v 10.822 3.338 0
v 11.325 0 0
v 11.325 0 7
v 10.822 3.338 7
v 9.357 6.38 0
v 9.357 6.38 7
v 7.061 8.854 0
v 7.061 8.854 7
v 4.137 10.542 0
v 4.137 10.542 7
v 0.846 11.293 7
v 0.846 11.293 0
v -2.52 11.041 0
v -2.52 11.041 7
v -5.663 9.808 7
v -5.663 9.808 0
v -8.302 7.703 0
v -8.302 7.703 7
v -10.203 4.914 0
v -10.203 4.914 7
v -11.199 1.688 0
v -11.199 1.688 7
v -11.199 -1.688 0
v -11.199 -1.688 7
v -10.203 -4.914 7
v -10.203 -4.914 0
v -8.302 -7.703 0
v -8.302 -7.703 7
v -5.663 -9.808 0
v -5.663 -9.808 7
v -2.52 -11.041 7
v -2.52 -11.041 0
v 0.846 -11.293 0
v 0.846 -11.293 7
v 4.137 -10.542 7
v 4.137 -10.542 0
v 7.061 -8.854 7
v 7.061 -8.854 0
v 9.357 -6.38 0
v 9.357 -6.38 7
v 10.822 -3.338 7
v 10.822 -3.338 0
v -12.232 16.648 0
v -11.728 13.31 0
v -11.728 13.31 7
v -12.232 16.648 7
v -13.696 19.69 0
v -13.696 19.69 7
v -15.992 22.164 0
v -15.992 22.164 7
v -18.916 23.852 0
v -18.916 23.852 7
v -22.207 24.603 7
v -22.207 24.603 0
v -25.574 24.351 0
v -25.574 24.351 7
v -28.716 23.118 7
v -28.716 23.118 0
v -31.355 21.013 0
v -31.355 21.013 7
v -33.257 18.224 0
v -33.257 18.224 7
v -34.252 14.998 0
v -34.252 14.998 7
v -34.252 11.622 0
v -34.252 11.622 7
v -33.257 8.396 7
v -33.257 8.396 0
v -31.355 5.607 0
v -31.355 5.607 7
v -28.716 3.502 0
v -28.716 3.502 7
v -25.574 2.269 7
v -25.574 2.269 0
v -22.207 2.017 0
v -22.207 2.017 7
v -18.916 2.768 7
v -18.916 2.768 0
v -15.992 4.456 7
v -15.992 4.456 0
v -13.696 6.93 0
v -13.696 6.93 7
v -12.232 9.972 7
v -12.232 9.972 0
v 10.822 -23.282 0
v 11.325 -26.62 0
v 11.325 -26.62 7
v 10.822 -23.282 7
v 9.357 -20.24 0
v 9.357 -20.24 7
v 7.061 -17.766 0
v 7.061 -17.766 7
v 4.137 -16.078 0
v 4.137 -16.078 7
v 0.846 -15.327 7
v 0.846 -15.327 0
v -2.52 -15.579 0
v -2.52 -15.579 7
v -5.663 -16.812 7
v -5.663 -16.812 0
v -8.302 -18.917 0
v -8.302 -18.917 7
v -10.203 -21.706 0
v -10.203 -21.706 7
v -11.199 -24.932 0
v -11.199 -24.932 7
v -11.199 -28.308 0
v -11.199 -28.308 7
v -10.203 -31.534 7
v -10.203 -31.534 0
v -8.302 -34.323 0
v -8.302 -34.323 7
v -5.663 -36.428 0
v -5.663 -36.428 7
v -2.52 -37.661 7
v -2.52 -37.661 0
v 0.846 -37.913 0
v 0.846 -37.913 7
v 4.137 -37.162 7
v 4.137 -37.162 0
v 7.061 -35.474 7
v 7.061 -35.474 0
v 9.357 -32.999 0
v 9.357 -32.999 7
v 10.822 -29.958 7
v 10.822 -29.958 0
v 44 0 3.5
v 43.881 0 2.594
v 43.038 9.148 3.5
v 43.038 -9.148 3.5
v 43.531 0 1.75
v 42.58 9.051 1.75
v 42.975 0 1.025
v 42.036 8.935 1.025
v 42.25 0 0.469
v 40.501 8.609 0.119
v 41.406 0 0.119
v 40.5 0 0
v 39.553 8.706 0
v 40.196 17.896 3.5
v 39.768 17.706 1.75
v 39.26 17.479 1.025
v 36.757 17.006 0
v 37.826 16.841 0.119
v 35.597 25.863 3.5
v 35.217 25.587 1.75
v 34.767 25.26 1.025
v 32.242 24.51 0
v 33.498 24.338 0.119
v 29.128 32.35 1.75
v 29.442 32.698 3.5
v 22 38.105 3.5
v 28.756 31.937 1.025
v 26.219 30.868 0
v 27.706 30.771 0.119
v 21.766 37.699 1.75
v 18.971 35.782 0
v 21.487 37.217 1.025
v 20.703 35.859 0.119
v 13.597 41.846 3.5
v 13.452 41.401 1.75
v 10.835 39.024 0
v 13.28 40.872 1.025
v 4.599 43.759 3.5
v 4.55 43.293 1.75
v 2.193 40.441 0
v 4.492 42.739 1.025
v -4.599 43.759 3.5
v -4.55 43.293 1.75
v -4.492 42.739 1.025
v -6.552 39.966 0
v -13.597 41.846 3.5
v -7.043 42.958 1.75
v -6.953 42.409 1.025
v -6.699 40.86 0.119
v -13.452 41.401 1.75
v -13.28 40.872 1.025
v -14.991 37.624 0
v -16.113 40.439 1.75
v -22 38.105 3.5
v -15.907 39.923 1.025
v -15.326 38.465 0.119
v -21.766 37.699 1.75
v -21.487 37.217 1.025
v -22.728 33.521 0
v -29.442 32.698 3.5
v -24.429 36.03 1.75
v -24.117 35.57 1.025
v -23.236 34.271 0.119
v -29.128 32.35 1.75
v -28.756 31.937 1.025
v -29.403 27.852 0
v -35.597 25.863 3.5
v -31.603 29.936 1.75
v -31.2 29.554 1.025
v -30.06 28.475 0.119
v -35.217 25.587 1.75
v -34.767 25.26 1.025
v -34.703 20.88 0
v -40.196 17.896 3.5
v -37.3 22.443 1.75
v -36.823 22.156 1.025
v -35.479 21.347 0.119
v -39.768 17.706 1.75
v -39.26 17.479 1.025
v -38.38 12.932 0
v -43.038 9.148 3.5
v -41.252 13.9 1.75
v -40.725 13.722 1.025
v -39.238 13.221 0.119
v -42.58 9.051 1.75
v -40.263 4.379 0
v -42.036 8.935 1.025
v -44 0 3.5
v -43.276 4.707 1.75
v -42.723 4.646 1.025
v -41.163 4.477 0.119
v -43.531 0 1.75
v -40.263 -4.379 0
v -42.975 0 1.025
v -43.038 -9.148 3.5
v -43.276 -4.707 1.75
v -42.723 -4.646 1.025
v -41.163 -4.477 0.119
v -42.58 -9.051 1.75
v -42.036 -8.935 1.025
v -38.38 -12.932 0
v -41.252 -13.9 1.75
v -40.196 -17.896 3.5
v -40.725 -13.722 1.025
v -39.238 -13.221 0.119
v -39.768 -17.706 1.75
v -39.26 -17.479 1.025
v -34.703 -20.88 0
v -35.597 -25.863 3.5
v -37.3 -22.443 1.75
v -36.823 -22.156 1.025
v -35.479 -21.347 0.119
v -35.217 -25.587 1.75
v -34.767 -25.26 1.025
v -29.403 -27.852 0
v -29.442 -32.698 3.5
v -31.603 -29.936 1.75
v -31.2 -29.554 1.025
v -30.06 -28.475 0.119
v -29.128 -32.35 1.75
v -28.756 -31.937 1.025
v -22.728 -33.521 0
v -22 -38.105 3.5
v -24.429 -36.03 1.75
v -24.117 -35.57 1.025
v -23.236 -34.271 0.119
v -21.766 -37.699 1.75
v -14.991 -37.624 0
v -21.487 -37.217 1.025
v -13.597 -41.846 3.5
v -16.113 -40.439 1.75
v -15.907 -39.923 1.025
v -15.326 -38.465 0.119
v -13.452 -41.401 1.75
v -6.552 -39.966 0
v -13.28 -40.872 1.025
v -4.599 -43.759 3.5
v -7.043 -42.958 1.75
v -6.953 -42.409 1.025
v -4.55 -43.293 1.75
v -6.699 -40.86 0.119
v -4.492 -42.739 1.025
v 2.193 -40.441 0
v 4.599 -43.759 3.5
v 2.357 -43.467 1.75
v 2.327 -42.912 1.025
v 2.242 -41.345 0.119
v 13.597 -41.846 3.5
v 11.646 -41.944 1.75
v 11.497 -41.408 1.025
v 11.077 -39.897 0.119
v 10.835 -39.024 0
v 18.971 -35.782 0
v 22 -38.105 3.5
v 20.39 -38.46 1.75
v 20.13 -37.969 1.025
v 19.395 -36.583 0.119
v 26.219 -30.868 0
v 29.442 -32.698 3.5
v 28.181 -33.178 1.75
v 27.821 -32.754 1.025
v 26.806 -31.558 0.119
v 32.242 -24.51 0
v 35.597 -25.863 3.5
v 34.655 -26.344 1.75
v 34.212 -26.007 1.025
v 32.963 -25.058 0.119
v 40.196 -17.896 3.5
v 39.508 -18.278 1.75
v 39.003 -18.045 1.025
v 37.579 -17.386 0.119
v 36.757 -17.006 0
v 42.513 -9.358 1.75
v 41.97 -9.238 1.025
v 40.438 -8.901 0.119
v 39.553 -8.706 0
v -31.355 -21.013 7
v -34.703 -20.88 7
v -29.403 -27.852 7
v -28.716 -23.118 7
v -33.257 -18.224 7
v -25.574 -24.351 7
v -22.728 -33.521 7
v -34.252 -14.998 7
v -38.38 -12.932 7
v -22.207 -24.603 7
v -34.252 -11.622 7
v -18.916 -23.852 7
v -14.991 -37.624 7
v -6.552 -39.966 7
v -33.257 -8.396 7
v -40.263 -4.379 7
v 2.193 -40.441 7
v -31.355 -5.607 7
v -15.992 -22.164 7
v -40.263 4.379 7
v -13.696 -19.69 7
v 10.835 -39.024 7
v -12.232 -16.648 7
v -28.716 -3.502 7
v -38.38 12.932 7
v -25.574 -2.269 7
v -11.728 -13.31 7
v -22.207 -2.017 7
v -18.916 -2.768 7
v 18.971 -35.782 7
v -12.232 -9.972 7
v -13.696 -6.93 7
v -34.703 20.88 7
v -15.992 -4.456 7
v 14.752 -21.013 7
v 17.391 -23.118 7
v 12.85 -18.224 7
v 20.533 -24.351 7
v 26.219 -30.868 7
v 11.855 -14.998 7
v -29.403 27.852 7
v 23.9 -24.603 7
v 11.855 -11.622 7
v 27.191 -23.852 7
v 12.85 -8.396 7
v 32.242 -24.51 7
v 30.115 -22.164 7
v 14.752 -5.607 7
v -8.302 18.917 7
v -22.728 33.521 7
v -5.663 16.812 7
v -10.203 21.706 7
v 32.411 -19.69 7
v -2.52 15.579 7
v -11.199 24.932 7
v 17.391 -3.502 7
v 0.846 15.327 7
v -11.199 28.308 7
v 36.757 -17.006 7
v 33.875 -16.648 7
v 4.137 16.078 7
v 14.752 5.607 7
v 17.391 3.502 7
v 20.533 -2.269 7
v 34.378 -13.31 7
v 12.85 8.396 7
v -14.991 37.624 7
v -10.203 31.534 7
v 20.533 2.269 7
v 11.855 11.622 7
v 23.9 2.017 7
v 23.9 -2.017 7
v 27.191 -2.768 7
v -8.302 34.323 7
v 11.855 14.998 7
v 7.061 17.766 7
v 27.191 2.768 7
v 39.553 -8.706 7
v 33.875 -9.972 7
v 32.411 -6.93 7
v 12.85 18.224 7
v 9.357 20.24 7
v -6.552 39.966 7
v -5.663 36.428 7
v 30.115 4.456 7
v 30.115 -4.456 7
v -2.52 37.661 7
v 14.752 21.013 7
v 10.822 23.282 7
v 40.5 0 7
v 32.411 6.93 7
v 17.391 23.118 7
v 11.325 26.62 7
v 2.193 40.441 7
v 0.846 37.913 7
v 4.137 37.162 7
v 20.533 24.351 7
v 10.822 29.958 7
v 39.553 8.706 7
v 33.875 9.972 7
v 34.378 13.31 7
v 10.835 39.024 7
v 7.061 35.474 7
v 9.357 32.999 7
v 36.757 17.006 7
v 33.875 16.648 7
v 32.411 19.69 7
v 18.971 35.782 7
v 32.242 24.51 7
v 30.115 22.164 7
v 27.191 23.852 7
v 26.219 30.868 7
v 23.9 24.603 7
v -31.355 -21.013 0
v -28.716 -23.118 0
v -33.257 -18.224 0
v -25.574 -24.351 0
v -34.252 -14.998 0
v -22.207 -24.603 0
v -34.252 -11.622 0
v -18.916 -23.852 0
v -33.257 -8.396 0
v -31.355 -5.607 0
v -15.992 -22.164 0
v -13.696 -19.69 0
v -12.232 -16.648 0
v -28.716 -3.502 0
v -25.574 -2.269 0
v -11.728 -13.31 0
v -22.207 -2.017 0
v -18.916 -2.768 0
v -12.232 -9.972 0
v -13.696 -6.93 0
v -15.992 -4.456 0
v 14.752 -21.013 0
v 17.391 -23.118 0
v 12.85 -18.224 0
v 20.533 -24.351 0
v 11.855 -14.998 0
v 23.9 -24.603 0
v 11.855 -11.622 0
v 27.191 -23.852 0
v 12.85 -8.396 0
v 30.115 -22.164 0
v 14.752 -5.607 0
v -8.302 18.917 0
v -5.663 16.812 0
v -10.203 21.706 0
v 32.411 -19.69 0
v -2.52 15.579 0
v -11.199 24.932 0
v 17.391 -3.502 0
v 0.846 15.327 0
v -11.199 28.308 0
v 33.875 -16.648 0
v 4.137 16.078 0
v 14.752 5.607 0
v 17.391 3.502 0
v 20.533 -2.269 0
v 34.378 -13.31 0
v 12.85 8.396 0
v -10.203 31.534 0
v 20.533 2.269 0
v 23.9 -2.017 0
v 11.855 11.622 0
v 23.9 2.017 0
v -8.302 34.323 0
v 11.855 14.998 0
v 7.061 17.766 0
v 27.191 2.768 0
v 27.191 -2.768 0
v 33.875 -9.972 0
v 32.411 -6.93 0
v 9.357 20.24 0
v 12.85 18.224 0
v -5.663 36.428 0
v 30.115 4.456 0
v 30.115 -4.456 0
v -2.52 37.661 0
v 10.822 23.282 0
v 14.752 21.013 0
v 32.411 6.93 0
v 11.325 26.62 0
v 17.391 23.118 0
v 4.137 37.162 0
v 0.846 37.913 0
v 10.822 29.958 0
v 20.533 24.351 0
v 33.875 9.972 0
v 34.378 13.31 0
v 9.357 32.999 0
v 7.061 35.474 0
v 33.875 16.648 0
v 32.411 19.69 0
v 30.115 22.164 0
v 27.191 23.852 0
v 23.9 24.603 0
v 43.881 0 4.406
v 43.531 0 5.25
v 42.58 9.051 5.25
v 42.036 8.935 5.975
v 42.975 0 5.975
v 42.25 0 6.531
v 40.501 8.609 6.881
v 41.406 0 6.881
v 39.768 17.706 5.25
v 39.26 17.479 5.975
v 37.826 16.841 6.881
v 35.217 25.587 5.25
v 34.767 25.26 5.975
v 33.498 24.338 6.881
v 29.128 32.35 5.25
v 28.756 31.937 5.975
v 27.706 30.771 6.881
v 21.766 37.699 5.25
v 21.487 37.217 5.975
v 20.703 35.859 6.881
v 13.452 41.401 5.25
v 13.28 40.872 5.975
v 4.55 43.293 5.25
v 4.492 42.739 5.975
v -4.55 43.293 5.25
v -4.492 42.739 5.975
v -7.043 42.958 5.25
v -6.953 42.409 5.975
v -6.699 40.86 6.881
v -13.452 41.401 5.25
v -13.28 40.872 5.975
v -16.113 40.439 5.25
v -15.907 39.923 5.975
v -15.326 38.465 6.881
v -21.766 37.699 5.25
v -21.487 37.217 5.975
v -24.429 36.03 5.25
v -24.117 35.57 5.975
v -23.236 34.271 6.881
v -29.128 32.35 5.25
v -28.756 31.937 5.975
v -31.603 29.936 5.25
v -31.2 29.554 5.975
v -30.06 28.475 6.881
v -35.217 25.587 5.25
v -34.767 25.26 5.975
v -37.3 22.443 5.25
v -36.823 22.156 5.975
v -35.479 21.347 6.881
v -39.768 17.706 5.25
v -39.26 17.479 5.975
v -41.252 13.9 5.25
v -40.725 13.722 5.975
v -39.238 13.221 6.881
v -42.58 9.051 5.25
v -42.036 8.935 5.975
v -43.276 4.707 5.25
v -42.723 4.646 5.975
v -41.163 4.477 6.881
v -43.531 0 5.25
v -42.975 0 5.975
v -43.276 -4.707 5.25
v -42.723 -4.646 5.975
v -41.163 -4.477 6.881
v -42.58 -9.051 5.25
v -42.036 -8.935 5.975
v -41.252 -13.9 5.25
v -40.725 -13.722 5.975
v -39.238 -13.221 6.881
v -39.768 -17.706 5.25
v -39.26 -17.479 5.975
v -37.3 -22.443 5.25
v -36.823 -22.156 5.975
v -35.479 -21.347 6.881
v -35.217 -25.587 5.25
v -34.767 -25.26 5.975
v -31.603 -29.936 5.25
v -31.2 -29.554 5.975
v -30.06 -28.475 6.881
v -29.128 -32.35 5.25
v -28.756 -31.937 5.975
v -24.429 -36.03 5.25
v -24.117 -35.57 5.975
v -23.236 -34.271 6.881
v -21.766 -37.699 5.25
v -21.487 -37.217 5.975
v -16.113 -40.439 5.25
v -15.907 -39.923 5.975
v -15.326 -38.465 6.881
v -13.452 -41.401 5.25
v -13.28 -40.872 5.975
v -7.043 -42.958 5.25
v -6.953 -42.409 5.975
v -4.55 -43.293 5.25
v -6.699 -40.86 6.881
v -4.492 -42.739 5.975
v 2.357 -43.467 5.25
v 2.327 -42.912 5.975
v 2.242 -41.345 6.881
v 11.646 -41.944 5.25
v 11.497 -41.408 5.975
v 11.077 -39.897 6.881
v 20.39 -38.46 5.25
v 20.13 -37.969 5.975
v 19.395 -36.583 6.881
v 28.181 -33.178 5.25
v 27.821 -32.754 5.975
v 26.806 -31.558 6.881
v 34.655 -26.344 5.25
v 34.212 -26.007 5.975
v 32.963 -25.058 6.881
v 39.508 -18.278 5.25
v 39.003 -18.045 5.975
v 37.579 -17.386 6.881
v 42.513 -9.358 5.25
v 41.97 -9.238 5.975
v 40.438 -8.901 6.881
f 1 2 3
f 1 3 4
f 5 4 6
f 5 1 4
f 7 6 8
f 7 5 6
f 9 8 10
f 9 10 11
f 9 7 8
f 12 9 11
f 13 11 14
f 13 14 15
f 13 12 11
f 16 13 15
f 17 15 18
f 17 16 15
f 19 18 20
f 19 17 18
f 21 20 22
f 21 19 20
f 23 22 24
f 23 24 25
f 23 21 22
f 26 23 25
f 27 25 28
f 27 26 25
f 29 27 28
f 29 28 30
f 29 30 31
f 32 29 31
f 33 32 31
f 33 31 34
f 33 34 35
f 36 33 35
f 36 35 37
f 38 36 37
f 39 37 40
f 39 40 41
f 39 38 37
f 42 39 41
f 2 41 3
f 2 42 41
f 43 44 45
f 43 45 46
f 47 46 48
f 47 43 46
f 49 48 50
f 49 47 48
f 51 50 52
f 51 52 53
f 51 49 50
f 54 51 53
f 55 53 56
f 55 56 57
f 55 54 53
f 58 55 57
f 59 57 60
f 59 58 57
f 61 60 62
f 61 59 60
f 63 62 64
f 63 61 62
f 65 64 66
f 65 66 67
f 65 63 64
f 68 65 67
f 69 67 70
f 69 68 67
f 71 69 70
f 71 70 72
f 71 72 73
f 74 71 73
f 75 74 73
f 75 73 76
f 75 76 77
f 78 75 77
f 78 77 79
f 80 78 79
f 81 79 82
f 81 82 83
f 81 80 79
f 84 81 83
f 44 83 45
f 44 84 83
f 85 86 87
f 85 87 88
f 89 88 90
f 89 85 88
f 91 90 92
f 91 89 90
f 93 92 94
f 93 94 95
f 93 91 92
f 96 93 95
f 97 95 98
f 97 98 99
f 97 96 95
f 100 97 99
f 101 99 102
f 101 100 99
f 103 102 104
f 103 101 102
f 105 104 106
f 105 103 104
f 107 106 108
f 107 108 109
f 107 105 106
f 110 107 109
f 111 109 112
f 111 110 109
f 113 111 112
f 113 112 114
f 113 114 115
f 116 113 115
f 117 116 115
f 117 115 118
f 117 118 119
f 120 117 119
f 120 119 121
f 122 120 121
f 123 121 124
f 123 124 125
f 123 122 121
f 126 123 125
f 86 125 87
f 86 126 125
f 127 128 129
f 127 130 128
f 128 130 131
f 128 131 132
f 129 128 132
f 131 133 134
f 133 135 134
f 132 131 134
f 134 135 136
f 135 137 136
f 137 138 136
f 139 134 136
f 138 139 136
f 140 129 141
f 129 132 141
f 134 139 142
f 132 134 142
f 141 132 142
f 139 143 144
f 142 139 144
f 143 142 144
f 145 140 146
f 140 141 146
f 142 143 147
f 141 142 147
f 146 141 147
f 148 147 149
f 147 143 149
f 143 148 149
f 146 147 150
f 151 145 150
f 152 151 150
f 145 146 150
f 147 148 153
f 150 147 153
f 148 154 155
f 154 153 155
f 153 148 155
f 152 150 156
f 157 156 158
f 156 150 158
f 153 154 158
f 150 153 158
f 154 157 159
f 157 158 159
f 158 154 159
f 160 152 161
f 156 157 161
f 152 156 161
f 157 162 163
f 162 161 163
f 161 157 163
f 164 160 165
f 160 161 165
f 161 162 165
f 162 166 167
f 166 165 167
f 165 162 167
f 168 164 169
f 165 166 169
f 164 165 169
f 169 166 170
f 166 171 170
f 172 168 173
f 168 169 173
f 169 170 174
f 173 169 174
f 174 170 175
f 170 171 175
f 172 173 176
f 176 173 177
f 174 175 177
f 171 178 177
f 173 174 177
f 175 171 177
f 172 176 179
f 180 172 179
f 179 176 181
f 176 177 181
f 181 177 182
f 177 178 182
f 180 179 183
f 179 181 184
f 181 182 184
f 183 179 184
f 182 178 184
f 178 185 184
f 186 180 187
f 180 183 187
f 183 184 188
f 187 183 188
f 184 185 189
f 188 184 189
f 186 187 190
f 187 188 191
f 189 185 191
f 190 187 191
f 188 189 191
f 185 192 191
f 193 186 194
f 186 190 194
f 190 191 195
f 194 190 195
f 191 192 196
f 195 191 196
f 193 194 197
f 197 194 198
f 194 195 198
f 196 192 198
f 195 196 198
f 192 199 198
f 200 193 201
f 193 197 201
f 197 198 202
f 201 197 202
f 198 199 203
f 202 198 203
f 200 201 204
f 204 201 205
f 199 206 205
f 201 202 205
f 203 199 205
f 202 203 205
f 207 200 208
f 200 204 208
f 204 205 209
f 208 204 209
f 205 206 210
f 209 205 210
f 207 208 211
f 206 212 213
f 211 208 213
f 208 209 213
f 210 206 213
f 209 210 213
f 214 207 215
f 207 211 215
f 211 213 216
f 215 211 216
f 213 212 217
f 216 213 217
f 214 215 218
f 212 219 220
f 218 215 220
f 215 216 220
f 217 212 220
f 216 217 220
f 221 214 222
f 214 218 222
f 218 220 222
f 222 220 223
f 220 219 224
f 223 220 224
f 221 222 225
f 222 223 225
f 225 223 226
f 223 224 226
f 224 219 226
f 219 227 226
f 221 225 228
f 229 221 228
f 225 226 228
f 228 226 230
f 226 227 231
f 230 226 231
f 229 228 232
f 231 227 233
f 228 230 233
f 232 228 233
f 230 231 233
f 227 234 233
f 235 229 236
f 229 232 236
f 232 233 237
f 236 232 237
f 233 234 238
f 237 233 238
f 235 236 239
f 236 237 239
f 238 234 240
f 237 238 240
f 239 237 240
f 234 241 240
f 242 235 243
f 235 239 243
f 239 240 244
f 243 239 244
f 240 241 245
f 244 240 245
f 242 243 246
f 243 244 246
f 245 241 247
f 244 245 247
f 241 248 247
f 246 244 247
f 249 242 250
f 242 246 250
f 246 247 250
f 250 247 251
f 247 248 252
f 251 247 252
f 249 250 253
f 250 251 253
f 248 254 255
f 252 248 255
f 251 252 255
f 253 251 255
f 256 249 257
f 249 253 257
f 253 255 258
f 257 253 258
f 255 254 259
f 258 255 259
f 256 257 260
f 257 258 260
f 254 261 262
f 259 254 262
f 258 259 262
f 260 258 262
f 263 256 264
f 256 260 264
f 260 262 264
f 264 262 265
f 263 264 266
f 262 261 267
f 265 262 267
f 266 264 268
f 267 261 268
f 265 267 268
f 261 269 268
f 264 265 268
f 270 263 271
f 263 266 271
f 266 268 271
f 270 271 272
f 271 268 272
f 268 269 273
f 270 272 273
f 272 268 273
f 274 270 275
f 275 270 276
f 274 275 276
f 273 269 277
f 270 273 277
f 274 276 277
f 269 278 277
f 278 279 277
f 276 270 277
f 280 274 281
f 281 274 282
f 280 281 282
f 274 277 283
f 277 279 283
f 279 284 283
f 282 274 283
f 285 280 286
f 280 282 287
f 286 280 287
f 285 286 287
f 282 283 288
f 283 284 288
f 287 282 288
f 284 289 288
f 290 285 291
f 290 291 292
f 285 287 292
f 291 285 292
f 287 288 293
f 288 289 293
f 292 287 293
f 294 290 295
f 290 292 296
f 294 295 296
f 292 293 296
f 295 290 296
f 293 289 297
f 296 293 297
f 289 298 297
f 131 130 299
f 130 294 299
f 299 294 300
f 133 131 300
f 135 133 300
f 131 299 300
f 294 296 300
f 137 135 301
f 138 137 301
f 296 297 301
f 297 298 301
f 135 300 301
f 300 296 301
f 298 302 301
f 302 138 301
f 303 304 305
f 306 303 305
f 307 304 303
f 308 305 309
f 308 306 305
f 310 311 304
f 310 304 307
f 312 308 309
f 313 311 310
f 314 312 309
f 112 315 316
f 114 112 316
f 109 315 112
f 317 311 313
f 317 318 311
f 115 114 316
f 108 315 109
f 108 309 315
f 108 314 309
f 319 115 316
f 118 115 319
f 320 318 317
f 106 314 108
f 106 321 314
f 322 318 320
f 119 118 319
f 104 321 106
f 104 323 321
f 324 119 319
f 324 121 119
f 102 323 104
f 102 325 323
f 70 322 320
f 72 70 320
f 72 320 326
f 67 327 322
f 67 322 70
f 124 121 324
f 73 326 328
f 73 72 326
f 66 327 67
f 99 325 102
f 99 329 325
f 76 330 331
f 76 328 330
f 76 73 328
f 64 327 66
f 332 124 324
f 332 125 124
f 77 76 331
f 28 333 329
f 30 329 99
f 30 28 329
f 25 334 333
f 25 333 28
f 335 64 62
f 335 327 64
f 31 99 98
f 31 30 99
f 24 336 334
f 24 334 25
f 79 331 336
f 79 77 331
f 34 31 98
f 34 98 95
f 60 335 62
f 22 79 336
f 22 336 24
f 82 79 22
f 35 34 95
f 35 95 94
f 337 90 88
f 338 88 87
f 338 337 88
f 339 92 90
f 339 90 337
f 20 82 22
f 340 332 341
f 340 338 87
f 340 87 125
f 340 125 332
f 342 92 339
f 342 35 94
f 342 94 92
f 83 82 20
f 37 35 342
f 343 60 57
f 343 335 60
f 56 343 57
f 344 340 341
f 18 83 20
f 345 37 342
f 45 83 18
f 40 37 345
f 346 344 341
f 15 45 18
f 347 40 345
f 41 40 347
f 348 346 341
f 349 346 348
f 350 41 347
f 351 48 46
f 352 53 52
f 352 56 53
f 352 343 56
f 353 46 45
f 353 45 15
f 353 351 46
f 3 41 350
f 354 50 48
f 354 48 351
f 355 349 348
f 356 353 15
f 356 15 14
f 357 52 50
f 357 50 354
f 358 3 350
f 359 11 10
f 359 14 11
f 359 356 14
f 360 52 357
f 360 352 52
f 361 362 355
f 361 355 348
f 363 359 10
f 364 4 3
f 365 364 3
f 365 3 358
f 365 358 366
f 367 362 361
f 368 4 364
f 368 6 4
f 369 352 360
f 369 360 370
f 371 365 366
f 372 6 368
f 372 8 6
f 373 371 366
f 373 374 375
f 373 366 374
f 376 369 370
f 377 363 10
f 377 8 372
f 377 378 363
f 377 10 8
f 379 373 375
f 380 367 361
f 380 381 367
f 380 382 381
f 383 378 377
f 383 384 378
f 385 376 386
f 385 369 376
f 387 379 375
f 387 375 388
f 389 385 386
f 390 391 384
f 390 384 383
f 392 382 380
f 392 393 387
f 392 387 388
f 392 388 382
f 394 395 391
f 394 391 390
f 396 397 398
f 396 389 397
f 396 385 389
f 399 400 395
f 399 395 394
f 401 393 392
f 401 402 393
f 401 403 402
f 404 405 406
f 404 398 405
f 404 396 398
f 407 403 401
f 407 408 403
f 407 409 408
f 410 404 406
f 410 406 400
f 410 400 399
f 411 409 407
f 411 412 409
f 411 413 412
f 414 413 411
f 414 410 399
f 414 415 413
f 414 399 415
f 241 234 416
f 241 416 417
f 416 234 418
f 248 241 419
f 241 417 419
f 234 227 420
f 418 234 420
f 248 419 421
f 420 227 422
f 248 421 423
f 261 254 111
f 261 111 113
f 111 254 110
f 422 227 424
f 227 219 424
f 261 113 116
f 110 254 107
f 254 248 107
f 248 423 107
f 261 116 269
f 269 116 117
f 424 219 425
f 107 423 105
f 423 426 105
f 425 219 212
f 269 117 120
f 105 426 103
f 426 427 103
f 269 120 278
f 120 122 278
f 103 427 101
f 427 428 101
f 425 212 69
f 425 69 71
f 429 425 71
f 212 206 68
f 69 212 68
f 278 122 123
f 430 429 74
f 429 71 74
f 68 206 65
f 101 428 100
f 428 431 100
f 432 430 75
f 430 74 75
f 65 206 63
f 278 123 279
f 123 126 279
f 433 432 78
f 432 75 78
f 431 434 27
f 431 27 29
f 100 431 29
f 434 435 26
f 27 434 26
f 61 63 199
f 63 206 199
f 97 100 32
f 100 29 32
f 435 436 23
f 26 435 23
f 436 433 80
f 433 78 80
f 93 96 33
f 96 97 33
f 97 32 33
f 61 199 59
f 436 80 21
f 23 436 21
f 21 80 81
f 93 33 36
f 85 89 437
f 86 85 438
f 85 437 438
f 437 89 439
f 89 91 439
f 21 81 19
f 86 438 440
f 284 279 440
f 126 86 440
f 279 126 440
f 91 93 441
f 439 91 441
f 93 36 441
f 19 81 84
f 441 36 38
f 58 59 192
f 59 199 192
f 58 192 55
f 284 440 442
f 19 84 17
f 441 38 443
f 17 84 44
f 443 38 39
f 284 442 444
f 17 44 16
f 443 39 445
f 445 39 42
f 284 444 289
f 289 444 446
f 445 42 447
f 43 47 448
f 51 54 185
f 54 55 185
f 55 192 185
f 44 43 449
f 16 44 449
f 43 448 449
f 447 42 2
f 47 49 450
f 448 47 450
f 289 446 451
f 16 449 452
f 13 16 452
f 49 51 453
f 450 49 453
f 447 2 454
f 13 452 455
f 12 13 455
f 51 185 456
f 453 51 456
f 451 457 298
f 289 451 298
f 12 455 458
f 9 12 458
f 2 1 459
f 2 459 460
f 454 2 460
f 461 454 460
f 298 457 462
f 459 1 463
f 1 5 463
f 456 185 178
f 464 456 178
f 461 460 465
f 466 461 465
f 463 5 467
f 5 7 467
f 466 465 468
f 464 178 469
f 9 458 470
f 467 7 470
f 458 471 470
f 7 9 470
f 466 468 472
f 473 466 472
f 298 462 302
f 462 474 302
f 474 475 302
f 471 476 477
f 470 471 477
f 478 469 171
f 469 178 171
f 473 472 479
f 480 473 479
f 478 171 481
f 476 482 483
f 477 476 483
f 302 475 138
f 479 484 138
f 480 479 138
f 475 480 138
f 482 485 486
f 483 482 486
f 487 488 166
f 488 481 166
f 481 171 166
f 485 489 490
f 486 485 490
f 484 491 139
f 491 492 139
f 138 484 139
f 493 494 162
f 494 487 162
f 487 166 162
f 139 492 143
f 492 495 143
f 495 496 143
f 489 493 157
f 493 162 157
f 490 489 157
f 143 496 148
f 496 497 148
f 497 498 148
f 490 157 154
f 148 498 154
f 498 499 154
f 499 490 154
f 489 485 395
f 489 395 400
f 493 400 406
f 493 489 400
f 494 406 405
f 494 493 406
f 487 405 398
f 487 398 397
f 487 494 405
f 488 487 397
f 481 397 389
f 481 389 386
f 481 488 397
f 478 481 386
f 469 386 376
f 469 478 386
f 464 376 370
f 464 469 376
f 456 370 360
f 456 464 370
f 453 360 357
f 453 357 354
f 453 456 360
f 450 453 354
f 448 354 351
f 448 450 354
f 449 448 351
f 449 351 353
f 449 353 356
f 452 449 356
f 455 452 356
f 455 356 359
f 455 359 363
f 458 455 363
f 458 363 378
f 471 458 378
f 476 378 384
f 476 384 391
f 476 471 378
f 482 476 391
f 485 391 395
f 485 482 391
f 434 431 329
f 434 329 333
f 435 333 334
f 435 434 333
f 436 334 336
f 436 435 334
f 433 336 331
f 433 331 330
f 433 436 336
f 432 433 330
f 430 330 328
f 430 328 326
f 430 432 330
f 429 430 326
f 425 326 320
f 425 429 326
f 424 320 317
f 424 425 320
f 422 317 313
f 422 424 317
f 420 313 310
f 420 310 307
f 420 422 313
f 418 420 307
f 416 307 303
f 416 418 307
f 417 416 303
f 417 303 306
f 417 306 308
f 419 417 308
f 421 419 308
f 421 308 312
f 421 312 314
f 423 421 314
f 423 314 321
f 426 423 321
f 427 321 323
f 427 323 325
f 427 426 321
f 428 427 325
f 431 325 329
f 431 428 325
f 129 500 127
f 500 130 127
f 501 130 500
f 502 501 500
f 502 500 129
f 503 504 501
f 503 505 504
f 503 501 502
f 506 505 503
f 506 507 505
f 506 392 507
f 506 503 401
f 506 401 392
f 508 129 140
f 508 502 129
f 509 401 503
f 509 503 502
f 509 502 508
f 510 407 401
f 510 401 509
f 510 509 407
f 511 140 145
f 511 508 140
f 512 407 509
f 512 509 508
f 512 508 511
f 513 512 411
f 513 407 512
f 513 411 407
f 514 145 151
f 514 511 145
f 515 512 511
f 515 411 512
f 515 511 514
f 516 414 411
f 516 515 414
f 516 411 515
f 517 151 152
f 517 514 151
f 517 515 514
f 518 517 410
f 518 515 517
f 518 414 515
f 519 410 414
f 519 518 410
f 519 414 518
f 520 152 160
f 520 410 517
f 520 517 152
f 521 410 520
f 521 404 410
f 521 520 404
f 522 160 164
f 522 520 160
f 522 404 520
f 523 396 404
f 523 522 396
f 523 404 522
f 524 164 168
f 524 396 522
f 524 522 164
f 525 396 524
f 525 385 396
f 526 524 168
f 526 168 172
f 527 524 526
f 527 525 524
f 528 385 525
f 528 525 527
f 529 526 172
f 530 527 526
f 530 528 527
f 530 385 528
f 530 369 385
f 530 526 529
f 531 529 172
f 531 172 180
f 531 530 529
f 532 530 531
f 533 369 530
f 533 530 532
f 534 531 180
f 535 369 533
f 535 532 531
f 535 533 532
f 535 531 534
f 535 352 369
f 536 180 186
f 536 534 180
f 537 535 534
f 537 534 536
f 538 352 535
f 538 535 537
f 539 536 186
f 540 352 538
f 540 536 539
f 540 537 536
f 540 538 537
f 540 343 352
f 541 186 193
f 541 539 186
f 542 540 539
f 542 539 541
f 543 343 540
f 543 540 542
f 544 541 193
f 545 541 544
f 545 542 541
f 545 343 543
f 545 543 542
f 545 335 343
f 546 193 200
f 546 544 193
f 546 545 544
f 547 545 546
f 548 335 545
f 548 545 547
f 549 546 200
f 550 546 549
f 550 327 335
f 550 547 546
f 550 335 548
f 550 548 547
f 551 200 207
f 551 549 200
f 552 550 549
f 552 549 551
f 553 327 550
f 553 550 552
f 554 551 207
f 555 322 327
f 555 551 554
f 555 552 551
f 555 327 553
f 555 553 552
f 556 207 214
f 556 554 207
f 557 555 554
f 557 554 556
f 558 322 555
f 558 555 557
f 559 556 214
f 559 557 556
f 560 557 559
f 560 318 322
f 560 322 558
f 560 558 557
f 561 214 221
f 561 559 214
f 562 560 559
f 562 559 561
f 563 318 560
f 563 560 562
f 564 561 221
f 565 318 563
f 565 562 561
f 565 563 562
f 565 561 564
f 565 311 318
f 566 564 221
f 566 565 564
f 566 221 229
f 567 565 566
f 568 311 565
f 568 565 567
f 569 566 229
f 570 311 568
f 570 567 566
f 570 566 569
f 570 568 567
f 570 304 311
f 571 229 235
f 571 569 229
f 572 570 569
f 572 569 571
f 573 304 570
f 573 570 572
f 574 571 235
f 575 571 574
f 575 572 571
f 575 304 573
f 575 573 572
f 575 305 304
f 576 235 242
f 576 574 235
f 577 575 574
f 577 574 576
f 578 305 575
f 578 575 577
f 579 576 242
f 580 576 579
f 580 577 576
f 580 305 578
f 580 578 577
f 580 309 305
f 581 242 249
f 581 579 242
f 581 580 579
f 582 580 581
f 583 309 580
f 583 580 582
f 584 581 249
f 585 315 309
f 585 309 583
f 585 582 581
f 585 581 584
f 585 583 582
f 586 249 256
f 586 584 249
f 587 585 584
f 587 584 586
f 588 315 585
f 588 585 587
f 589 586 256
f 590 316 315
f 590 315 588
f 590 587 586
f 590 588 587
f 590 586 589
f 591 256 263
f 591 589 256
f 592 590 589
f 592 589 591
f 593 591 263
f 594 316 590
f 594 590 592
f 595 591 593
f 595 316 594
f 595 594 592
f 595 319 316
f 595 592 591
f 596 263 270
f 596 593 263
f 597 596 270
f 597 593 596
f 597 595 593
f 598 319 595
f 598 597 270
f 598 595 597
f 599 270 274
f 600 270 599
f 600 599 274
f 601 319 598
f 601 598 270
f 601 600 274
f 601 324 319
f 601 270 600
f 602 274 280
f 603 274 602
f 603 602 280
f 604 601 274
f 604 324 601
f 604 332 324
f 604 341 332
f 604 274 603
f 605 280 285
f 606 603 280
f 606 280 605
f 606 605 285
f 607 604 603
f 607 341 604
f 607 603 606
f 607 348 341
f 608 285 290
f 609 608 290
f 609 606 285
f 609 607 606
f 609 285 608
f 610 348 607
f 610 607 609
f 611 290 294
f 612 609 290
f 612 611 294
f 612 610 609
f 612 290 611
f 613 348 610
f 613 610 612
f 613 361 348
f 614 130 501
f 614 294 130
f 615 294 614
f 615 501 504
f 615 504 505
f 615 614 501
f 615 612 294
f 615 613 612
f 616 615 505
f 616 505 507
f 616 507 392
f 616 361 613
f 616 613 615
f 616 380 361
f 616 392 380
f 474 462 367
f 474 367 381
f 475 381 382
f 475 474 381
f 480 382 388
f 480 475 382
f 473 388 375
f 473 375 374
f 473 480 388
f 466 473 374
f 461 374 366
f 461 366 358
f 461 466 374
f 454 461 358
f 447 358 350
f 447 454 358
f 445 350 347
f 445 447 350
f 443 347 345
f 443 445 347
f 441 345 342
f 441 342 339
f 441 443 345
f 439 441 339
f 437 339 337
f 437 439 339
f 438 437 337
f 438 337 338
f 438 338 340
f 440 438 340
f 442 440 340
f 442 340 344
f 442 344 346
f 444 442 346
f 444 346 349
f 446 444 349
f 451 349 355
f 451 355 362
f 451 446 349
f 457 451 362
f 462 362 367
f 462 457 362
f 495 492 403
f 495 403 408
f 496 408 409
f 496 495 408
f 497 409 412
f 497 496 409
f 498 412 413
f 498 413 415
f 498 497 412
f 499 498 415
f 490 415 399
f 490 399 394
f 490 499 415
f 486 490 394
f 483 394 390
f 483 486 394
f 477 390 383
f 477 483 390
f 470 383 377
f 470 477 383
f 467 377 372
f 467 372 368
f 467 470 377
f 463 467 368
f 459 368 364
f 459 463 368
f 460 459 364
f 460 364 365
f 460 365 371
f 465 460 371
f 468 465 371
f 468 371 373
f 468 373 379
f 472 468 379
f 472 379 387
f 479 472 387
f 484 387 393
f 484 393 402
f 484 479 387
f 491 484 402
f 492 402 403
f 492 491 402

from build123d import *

# Parameters (mm, degrees)
F0_R     = 44
F0_R_2   = 11.325
F1_DEPTH = 7
F2_R     = 3.5
F3_R     = 3.49999


# Not quite as in the source:
# - a fillet or chamfer is up to 0.001 mm smaller than in the source, because OpenCascade refuses the exact size


with BuildPart() as f1:
    # F0 (on Top) → F1 (new body)
    with BuildSketch(Plane.XY):
        Circle(F0_R)
        with Locations((-23.0534838522, -13.3099351078)):
            Circle(F0_R_2, mode=Mode.SUBTRACT)
        with Locations((0, -26.6198702157)):
            Circle(F0_R_2, mode=Mode.SUBTRACT)
        with Locations((23.0534838522, -13.3099351078)):
            Circle(F0_R_2, mode=Mode.SUBTRACT)
        with Locations((-23.0534838522, 13.3099351078)):
            Circle(F0_R_2, mode=Mode.SUBTRACT)
        Circle(F0_R_2, mode=Mode.SUBTRACT)
        with Locations((23.0534838522, 13.3099351078)):
            Circle(F0_R_2, mode=Mode.SUBTRACT)
        with Locations((0, 26.6198702157)):
            Circle(F0_R_2, mode=Mode.SUBTRACT)
    extrude(amount=F1_DEPTH)

    # F2
    f2_edges = [f1.edges().sort_by_distance(p)[0] for p in [
        (-44, 0, 7),
    ]]
    fillet(f2_edges, radius=F2_R)

    # F3 (radius 3.5 in the source; OpenCascade refuses exactly that, so slightly less here)
    f3_edges = [f1.edges().sort_by_distance(p)[0] for p in [
        (-44, 0, 0),
    ]]
    fillet(f3_edges, radius=F3_R)


solid = f1.part
